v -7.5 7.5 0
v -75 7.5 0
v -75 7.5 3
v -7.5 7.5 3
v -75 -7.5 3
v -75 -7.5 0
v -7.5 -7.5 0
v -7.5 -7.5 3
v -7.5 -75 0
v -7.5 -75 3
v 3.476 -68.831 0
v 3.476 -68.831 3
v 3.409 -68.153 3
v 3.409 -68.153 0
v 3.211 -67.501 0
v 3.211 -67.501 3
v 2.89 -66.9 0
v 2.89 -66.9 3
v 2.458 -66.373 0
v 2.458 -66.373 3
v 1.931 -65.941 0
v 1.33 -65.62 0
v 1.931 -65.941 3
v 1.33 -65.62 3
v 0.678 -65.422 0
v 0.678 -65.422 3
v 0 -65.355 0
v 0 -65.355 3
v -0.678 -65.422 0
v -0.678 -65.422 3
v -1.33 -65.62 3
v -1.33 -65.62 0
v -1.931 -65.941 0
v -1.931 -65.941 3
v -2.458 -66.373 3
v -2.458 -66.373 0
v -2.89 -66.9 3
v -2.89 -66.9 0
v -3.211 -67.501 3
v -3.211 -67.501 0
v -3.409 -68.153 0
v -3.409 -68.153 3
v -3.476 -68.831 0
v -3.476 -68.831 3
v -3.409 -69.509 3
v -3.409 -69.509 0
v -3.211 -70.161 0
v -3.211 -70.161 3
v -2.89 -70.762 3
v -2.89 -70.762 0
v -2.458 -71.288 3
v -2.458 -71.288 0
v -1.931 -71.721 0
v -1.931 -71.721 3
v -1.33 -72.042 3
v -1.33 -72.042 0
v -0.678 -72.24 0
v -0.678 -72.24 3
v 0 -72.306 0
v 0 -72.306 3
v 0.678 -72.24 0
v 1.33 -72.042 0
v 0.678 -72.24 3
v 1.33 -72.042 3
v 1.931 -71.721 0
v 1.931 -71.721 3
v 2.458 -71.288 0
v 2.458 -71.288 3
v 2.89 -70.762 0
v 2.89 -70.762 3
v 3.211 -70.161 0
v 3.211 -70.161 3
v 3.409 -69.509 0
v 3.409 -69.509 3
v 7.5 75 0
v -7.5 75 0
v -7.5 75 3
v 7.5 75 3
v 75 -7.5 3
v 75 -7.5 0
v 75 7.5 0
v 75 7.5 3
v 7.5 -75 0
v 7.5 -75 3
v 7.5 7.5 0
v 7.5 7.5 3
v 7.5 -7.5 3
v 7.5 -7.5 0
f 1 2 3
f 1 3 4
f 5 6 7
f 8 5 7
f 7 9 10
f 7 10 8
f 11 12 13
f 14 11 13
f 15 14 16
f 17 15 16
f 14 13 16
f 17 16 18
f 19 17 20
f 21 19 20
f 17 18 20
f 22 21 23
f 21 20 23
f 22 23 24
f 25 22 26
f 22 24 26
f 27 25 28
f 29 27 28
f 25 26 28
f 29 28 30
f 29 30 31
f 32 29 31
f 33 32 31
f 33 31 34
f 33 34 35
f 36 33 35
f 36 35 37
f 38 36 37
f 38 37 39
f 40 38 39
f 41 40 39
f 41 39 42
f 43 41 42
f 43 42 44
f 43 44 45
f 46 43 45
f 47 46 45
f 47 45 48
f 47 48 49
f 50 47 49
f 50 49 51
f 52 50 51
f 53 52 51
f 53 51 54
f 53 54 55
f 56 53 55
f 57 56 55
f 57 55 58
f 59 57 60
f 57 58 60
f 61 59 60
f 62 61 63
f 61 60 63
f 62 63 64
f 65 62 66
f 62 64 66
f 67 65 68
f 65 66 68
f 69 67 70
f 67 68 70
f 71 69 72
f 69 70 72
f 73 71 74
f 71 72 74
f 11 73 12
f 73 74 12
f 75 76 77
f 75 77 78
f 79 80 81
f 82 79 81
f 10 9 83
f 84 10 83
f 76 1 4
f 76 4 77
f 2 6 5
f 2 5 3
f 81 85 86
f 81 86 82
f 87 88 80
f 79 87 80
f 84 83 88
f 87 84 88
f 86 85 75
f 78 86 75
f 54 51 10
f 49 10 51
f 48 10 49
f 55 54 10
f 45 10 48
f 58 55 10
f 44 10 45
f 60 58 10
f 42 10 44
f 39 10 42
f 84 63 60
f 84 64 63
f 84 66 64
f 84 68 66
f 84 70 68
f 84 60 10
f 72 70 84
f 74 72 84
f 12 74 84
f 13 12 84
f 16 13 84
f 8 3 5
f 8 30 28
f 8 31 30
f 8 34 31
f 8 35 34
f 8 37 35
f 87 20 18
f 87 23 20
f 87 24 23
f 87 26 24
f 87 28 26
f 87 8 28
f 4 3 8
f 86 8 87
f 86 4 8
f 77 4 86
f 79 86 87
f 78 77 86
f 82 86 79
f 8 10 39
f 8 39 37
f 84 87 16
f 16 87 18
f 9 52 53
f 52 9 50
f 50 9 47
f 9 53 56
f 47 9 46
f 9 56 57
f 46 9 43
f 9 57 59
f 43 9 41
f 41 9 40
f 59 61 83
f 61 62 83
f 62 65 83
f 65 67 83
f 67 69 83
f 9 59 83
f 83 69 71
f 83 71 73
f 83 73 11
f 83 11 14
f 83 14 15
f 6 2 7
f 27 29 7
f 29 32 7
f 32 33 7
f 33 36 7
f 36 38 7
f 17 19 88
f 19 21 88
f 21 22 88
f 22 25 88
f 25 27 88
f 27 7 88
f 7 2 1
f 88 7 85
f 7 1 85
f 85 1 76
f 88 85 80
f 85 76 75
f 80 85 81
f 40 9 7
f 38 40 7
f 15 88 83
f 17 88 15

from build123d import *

# Parameters (mm, degrees)
F0_W     = 150
F0_H     = 15
F1_DEPTH = 3
F2_W     = 15
F2_H     = 150
F3_DEPTH = 3
F4_R     = 3.475604
F5_DEPTH = 25


with BuildPart() as f1:
    # F0 (on Top) → F1 (new body)
    with BuildSketch(Plane.XY):
        Rectangle(F0_W, F0_H)
    extrude(amount=F1_DEPTH)

    # F2 (on Top) → F3 (join)
    with BuildSketch(Plane.XY):
        Rectangle(F2_W, F2_H)
    extrude(amount=F3_DEPTH)

    # F4 (on face) → F5 (cut)
    with BuildSketch(Plane.XY.offset(3)):
        with Locations((0, -68.830863)):
            Circle(F4_R)
    extrude(amount=-F5_DEPTH, mode=Mode.SUBTRACT)


solid = f1.part
